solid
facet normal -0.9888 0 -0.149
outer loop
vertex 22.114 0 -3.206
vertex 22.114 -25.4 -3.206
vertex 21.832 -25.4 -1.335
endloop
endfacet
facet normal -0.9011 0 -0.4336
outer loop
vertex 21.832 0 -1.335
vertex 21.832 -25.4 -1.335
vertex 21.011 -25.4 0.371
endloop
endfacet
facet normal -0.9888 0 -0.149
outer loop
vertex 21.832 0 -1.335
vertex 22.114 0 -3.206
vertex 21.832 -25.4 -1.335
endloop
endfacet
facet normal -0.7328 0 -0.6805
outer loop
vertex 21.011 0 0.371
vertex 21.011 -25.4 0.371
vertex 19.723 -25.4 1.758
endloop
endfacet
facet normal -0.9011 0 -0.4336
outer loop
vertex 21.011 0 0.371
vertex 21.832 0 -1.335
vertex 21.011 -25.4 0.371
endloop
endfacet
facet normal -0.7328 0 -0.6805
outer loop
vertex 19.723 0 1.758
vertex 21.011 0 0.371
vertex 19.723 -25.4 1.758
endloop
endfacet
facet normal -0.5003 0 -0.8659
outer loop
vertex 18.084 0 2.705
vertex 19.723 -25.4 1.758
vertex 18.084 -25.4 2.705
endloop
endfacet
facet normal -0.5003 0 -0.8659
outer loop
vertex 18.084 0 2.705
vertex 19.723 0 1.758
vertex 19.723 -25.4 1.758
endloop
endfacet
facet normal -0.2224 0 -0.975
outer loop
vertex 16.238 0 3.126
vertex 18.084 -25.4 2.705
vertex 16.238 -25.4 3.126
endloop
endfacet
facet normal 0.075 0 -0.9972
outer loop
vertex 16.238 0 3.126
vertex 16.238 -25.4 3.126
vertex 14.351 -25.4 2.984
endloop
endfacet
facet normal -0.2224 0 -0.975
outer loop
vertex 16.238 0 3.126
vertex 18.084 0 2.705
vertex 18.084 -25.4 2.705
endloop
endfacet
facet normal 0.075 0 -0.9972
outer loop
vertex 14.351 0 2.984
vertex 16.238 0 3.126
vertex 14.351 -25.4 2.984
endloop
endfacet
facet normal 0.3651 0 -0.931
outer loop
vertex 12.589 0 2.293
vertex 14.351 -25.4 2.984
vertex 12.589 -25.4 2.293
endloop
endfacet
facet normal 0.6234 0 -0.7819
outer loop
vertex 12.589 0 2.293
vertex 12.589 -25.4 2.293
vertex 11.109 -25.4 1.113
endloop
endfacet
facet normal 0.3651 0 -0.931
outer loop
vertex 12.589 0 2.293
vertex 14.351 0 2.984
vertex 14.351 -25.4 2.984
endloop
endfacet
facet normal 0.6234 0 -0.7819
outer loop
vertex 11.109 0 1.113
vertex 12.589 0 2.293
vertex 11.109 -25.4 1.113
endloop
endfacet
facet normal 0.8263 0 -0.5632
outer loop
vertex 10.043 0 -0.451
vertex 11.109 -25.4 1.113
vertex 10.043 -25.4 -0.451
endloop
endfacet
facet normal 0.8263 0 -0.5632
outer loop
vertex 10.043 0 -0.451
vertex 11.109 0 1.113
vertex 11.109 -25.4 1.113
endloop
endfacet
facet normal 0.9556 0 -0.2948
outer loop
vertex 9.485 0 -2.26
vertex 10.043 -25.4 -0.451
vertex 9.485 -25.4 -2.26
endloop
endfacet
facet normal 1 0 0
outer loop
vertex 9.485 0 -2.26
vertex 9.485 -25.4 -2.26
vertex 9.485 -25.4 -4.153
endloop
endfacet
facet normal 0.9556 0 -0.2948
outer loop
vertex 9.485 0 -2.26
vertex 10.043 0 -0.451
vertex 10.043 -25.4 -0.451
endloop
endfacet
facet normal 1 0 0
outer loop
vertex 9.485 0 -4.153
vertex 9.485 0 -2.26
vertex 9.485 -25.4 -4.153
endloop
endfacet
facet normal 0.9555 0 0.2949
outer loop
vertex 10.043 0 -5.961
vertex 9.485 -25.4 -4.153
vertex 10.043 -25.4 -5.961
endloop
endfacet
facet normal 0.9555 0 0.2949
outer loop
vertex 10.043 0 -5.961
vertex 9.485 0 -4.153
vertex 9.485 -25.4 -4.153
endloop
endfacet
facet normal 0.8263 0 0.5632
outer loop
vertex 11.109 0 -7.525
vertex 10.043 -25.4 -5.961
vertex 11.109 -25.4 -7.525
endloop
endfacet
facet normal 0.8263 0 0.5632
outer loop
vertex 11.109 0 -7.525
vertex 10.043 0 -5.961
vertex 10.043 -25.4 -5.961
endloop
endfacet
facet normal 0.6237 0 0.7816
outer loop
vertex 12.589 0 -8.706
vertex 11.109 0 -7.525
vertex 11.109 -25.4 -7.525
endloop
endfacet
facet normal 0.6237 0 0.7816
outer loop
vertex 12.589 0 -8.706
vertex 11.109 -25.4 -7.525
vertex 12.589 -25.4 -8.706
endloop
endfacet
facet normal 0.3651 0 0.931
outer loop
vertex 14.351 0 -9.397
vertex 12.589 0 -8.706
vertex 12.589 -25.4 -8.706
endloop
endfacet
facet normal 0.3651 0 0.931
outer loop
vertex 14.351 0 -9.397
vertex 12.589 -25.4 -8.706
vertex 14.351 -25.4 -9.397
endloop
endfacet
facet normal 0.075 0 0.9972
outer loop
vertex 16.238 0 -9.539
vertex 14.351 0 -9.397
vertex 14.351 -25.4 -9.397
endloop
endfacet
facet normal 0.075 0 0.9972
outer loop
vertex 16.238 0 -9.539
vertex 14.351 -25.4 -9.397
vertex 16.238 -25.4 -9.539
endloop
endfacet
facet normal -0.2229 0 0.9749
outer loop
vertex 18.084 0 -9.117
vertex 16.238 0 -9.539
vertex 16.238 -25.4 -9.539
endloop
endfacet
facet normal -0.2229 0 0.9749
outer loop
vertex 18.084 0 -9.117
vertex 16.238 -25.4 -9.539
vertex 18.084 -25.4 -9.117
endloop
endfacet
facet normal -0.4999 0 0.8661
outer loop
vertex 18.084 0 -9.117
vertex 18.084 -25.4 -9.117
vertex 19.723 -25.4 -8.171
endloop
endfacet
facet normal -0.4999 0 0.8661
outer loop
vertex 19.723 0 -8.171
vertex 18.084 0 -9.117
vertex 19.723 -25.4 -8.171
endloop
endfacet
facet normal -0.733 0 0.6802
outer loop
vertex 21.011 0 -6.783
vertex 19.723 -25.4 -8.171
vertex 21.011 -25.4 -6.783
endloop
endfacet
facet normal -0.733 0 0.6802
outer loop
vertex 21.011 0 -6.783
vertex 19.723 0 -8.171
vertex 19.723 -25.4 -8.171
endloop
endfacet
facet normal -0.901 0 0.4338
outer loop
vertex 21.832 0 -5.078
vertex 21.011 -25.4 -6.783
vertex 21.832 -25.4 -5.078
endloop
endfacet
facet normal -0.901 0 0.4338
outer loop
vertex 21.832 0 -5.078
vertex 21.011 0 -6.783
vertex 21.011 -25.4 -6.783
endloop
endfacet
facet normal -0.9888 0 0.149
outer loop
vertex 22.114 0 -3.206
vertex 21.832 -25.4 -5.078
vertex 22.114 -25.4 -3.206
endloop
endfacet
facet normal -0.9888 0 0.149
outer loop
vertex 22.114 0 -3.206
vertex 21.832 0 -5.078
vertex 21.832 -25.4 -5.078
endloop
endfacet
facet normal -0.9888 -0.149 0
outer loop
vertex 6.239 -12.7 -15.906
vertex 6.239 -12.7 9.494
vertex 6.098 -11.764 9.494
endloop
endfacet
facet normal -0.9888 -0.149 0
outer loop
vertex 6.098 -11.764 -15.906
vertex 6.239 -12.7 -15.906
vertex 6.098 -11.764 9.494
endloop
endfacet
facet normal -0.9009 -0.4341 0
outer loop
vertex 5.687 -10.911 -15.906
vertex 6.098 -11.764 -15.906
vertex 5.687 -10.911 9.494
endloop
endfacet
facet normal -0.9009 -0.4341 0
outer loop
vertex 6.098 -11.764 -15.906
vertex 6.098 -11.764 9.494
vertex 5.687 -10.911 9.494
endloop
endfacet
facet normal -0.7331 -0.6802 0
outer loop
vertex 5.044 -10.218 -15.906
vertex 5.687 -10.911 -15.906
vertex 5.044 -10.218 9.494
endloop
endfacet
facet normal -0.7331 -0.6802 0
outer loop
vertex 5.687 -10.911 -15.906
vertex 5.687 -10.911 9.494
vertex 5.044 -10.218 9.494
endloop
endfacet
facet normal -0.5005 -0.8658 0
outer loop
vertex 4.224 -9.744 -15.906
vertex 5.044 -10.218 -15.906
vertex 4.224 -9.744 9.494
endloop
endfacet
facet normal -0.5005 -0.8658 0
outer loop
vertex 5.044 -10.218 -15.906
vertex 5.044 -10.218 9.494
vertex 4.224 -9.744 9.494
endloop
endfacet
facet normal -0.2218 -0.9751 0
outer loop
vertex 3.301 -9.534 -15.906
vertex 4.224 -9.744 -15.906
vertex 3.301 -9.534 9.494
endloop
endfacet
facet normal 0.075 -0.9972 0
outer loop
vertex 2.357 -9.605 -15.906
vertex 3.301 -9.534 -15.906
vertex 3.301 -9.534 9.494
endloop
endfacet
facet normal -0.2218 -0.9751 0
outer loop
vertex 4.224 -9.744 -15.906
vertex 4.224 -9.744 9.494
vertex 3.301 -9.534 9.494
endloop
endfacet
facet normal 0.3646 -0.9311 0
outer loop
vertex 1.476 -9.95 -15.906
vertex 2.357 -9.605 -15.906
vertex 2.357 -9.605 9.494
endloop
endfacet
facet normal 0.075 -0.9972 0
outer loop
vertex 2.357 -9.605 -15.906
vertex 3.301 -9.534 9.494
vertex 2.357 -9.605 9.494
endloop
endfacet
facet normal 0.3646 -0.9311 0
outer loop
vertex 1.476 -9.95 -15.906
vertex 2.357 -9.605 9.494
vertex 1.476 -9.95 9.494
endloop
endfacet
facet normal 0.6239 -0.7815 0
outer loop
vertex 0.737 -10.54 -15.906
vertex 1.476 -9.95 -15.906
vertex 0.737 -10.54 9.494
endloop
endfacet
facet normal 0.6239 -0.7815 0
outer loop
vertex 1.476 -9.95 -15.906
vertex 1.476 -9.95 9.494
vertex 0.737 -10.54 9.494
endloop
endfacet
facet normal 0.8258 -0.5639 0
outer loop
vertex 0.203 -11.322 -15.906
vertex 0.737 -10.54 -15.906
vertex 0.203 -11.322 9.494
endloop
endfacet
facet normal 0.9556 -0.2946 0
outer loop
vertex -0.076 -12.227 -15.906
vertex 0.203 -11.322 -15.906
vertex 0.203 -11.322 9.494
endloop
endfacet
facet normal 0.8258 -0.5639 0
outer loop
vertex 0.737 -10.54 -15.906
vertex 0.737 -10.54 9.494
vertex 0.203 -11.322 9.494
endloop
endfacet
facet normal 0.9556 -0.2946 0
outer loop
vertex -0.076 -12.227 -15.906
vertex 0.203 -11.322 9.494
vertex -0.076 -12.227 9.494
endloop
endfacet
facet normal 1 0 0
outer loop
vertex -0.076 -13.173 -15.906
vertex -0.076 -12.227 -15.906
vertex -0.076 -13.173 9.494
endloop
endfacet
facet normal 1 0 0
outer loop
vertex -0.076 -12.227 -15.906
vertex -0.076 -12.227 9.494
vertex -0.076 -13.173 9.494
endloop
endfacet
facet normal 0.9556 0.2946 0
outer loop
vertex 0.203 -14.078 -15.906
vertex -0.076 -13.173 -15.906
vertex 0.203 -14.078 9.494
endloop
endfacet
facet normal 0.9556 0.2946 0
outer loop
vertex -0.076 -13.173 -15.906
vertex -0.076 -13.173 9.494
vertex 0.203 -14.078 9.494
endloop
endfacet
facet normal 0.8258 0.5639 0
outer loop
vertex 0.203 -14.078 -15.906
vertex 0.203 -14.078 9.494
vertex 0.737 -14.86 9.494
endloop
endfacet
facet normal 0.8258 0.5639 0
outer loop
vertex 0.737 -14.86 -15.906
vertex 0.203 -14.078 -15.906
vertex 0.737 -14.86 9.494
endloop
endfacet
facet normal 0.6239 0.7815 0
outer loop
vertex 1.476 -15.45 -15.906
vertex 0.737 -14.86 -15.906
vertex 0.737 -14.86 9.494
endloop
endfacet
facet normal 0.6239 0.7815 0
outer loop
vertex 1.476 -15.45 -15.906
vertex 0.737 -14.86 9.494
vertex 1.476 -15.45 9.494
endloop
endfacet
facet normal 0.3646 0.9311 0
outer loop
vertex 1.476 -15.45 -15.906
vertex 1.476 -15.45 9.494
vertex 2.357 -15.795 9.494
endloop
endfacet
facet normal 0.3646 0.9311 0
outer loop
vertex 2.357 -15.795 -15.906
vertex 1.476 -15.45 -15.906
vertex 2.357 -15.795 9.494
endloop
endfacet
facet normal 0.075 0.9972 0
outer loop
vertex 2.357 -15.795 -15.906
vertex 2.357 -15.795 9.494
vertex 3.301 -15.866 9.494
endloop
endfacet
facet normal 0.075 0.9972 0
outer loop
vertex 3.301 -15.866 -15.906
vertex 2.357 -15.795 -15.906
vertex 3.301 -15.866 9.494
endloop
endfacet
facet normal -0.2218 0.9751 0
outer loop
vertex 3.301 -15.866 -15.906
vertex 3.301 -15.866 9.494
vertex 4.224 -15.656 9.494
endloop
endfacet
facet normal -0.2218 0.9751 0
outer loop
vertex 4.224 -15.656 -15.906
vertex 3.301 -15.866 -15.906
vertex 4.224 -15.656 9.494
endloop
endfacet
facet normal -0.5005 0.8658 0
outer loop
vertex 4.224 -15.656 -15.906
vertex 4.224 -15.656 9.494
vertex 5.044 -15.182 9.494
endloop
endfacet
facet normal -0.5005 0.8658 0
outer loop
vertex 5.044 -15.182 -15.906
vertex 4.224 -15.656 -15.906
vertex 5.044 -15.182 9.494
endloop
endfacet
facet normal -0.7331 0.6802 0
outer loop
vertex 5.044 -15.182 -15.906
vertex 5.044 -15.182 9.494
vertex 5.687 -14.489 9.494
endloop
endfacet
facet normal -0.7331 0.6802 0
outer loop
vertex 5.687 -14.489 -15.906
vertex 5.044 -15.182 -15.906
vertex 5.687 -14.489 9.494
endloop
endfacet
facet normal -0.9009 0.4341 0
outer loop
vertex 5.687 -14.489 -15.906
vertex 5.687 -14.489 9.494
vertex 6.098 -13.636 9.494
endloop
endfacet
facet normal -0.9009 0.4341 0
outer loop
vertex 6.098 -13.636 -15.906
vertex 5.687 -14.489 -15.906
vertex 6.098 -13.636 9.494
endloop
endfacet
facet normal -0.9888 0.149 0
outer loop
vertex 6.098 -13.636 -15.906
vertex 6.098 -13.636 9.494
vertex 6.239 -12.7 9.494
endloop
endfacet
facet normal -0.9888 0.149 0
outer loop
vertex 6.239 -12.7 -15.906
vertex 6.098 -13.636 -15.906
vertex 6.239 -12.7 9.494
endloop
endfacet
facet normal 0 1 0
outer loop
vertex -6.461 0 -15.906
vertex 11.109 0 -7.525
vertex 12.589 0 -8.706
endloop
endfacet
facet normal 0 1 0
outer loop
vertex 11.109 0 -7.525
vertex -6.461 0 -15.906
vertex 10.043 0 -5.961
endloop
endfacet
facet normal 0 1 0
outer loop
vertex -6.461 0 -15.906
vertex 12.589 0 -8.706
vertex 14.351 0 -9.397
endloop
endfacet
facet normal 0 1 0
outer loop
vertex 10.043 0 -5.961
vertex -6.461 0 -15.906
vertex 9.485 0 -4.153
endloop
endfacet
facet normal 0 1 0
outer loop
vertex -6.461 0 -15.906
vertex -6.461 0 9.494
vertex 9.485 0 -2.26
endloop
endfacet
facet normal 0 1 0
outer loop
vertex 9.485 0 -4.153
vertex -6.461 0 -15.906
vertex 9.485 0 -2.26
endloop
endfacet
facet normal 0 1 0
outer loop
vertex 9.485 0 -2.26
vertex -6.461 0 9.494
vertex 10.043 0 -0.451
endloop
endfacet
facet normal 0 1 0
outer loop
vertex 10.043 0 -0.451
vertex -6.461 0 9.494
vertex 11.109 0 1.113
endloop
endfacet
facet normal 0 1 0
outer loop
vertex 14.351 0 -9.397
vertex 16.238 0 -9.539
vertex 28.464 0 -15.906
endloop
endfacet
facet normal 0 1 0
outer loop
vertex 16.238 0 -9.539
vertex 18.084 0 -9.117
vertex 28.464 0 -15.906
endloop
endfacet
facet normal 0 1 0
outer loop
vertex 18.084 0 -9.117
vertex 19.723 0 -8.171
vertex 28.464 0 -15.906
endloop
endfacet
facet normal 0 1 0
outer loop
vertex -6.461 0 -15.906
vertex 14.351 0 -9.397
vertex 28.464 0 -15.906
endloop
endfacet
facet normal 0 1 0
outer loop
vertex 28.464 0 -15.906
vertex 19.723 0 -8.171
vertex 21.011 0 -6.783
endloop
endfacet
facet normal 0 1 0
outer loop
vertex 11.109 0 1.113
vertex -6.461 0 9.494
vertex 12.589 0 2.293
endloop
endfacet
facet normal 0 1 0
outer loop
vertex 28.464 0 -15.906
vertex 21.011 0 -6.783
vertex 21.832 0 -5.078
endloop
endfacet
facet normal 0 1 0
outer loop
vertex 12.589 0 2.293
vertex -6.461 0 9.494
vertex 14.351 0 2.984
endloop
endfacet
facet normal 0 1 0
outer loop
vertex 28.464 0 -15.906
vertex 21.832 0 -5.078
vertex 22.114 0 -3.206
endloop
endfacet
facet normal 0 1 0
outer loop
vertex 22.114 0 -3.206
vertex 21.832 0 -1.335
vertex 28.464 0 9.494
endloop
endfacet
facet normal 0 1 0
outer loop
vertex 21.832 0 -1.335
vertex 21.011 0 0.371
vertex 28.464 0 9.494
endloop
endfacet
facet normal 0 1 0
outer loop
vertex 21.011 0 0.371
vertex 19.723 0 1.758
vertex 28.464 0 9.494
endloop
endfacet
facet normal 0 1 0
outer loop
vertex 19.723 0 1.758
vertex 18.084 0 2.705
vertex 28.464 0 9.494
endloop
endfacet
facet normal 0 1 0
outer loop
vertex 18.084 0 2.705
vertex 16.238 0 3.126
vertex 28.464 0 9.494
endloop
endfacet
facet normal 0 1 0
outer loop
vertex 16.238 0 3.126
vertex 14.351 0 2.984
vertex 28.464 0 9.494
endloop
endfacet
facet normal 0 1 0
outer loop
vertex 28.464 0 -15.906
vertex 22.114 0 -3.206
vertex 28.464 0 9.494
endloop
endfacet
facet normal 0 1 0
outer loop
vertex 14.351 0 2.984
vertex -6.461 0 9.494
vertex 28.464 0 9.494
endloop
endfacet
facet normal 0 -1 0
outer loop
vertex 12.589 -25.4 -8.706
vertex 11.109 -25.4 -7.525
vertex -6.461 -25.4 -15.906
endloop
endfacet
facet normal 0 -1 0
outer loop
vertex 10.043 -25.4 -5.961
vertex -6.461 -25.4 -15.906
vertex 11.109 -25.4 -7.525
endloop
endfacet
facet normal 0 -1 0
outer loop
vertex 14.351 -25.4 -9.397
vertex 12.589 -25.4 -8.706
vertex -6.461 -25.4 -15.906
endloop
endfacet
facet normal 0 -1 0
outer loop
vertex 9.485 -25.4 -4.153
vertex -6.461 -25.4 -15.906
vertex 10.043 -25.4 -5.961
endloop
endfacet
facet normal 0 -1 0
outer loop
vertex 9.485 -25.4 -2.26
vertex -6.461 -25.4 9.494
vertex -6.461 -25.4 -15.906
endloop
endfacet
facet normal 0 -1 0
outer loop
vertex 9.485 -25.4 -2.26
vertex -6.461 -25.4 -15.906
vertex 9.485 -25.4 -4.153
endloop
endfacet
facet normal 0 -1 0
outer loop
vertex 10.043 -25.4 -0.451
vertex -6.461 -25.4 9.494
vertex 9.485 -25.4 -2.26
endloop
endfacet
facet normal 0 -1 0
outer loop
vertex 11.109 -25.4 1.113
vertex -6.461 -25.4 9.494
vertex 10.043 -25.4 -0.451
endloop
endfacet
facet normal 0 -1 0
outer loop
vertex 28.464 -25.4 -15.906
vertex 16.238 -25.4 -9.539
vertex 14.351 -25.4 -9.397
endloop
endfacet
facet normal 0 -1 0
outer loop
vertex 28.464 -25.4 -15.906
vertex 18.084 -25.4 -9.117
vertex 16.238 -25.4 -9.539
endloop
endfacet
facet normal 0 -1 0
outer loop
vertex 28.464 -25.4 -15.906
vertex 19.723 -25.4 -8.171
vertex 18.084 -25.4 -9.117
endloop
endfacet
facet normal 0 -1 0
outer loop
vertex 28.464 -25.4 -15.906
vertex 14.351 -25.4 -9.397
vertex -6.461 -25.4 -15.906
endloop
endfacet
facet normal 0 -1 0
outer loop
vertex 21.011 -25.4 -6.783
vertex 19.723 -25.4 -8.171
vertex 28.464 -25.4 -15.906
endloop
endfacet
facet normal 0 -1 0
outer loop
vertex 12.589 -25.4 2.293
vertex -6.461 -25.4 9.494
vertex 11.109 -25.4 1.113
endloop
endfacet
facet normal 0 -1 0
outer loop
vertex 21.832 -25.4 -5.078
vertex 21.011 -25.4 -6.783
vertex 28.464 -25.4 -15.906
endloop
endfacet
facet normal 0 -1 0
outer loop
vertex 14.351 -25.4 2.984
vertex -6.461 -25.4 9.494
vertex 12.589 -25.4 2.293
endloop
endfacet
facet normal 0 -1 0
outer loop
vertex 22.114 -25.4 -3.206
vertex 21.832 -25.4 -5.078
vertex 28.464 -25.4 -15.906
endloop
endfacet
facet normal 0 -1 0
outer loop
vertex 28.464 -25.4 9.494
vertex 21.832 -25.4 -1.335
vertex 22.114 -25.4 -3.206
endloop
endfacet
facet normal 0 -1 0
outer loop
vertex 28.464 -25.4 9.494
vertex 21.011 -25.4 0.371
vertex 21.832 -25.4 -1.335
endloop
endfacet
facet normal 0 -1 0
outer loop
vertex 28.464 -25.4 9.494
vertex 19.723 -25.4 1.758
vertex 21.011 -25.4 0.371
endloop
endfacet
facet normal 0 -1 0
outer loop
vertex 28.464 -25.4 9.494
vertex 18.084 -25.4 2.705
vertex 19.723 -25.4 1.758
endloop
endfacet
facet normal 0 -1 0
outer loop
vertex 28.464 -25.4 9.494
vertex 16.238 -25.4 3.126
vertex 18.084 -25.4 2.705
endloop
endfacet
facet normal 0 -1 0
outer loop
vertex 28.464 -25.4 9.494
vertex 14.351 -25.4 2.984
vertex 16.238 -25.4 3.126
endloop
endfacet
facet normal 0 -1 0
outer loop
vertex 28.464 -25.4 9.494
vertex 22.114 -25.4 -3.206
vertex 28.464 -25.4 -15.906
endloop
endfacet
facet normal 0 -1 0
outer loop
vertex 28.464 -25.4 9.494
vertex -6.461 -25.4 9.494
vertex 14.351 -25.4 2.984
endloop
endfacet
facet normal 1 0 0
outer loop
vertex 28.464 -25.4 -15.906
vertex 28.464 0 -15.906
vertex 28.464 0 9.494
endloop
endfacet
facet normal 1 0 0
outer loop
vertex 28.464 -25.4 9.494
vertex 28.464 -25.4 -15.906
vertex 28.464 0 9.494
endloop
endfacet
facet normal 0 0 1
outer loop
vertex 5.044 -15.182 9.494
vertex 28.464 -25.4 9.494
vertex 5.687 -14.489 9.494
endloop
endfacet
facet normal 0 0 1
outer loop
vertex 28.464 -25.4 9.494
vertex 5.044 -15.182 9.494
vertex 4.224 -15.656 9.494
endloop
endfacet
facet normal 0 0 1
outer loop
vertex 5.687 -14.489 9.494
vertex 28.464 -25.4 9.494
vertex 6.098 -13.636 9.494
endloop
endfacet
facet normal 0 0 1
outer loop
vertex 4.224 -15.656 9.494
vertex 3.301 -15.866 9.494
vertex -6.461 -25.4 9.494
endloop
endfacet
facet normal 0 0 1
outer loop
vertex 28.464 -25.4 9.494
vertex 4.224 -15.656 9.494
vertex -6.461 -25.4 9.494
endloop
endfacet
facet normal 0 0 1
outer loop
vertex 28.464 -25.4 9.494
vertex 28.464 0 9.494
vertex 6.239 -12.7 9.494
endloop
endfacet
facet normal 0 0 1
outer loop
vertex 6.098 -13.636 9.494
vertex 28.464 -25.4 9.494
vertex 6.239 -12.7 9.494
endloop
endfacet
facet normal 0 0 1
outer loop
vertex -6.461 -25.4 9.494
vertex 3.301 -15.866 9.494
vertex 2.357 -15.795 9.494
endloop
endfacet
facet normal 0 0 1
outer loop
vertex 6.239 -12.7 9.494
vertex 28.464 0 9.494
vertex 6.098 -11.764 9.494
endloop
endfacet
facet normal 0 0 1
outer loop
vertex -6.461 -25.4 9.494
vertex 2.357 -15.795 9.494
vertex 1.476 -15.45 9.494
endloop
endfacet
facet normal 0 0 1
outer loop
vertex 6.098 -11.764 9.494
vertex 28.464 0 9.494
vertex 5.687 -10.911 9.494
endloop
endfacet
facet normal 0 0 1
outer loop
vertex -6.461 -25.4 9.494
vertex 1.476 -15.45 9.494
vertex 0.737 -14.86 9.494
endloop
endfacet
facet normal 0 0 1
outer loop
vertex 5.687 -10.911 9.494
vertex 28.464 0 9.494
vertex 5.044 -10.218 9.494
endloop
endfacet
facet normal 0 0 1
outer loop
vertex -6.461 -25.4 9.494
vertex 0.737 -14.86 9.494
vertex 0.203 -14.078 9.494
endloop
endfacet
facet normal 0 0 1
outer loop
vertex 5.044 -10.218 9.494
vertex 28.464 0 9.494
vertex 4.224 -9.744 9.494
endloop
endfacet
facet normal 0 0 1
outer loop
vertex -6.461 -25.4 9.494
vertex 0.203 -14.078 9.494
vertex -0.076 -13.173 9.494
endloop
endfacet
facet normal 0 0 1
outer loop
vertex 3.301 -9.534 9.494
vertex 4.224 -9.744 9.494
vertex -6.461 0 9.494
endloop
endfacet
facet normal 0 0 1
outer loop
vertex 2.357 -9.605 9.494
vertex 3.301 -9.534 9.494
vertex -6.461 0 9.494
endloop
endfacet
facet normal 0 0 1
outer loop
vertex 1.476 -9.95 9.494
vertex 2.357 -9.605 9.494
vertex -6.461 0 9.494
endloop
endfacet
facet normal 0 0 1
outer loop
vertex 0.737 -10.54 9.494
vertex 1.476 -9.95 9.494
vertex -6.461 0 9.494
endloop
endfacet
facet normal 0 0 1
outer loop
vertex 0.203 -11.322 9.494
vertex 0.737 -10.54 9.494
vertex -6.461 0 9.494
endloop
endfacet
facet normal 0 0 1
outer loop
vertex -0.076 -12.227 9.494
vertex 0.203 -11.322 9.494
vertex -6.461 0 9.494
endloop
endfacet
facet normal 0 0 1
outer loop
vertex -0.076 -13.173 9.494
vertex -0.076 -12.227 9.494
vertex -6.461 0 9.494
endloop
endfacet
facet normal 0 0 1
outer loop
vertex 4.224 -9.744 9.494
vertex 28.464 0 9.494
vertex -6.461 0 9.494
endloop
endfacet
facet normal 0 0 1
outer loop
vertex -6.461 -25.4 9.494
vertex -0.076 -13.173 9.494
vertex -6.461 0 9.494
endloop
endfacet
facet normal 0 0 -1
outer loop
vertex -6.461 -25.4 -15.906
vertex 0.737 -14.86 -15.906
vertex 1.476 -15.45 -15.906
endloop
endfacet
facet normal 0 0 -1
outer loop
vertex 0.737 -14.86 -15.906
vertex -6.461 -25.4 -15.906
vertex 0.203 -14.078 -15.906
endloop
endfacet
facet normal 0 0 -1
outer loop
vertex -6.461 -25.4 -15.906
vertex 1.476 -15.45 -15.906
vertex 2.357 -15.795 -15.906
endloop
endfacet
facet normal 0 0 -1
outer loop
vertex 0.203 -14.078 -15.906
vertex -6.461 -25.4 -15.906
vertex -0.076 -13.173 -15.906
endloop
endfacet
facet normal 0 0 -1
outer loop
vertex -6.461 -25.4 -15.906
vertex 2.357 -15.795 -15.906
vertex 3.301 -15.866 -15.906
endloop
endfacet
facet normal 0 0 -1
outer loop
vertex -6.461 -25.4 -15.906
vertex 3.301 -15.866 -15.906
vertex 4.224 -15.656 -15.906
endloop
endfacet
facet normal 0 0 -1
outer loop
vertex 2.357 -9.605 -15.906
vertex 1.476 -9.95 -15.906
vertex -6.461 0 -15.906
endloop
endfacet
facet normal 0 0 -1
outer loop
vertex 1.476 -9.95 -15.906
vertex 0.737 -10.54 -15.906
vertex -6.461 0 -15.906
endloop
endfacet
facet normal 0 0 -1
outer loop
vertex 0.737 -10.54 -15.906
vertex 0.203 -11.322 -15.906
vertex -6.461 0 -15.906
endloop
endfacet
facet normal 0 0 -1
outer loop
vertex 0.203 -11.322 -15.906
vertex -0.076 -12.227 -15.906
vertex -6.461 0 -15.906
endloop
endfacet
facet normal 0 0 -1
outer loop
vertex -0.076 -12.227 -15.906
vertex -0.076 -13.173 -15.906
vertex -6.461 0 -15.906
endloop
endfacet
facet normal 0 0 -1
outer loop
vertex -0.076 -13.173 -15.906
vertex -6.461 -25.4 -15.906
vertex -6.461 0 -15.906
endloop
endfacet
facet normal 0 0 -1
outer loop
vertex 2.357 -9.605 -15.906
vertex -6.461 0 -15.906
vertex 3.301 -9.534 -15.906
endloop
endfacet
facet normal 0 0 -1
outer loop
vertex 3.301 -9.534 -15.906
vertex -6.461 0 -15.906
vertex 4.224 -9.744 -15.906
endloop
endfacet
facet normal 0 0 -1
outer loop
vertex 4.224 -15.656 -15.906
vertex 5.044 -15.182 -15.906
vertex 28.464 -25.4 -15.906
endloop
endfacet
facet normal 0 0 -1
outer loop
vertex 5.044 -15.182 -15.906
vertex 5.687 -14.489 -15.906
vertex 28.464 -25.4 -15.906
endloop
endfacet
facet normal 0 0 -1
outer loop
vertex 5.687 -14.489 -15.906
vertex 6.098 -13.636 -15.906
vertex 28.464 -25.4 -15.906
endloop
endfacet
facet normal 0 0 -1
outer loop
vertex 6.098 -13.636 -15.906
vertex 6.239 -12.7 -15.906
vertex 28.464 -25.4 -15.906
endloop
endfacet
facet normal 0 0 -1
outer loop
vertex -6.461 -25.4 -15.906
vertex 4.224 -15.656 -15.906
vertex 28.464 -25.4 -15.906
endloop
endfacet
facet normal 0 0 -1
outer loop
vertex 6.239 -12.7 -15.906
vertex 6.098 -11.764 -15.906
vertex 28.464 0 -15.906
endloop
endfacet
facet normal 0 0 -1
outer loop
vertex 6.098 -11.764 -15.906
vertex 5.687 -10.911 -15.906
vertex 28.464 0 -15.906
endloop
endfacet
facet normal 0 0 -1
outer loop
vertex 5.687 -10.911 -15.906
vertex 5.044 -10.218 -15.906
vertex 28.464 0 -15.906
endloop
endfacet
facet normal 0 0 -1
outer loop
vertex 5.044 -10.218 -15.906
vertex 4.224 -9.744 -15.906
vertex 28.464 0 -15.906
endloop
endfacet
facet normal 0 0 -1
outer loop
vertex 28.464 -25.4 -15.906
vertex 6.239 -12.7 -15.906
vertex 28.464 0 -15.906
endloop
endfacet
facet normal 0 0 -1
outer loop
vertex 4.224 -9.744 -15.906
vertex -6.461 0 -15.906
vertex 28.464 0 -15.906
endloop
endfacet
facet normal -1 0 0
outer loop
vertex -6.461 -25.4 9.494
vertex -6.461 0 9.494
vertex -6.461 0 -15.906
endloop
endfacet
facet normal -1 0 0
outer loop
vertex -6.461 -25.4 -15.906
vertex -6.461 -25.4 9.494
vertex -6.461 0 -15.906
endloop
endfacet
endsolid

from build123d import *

# Parameters (mm, degrees)
F0_R     = 6.35
F1_DEPTH = 25.4
F2_R     = 3.175
F3_DEPTH = 50.8


with BuildPart() as f1:
    # F0 (on Front) → F1 (new body)
    with BuildSketch(Plane.XZ):
        Polygon((28.463945, 9.493677), (-6.461055, 9.493677), (-6.461055, -15.906323), (28.463945, -15.906323), (28.463945, -3.206323), align=None)
        with Locations((15.763945, -3.206323)):
            Circle(F0_R, mode=Mode.SUBTRACT)
    extrude(amount=F1_DEPTH)

    # F2 (on face) → F3 (cut)
    with BuildSketch(Plane.XY.offset(9.493677)):
        with Locations((3.063945, -12.7)):
            Circle(F2_R)
    extrude(amount=-F3_DEPTH, mode=Mode.SUBTRACT)


solid = f1.part
